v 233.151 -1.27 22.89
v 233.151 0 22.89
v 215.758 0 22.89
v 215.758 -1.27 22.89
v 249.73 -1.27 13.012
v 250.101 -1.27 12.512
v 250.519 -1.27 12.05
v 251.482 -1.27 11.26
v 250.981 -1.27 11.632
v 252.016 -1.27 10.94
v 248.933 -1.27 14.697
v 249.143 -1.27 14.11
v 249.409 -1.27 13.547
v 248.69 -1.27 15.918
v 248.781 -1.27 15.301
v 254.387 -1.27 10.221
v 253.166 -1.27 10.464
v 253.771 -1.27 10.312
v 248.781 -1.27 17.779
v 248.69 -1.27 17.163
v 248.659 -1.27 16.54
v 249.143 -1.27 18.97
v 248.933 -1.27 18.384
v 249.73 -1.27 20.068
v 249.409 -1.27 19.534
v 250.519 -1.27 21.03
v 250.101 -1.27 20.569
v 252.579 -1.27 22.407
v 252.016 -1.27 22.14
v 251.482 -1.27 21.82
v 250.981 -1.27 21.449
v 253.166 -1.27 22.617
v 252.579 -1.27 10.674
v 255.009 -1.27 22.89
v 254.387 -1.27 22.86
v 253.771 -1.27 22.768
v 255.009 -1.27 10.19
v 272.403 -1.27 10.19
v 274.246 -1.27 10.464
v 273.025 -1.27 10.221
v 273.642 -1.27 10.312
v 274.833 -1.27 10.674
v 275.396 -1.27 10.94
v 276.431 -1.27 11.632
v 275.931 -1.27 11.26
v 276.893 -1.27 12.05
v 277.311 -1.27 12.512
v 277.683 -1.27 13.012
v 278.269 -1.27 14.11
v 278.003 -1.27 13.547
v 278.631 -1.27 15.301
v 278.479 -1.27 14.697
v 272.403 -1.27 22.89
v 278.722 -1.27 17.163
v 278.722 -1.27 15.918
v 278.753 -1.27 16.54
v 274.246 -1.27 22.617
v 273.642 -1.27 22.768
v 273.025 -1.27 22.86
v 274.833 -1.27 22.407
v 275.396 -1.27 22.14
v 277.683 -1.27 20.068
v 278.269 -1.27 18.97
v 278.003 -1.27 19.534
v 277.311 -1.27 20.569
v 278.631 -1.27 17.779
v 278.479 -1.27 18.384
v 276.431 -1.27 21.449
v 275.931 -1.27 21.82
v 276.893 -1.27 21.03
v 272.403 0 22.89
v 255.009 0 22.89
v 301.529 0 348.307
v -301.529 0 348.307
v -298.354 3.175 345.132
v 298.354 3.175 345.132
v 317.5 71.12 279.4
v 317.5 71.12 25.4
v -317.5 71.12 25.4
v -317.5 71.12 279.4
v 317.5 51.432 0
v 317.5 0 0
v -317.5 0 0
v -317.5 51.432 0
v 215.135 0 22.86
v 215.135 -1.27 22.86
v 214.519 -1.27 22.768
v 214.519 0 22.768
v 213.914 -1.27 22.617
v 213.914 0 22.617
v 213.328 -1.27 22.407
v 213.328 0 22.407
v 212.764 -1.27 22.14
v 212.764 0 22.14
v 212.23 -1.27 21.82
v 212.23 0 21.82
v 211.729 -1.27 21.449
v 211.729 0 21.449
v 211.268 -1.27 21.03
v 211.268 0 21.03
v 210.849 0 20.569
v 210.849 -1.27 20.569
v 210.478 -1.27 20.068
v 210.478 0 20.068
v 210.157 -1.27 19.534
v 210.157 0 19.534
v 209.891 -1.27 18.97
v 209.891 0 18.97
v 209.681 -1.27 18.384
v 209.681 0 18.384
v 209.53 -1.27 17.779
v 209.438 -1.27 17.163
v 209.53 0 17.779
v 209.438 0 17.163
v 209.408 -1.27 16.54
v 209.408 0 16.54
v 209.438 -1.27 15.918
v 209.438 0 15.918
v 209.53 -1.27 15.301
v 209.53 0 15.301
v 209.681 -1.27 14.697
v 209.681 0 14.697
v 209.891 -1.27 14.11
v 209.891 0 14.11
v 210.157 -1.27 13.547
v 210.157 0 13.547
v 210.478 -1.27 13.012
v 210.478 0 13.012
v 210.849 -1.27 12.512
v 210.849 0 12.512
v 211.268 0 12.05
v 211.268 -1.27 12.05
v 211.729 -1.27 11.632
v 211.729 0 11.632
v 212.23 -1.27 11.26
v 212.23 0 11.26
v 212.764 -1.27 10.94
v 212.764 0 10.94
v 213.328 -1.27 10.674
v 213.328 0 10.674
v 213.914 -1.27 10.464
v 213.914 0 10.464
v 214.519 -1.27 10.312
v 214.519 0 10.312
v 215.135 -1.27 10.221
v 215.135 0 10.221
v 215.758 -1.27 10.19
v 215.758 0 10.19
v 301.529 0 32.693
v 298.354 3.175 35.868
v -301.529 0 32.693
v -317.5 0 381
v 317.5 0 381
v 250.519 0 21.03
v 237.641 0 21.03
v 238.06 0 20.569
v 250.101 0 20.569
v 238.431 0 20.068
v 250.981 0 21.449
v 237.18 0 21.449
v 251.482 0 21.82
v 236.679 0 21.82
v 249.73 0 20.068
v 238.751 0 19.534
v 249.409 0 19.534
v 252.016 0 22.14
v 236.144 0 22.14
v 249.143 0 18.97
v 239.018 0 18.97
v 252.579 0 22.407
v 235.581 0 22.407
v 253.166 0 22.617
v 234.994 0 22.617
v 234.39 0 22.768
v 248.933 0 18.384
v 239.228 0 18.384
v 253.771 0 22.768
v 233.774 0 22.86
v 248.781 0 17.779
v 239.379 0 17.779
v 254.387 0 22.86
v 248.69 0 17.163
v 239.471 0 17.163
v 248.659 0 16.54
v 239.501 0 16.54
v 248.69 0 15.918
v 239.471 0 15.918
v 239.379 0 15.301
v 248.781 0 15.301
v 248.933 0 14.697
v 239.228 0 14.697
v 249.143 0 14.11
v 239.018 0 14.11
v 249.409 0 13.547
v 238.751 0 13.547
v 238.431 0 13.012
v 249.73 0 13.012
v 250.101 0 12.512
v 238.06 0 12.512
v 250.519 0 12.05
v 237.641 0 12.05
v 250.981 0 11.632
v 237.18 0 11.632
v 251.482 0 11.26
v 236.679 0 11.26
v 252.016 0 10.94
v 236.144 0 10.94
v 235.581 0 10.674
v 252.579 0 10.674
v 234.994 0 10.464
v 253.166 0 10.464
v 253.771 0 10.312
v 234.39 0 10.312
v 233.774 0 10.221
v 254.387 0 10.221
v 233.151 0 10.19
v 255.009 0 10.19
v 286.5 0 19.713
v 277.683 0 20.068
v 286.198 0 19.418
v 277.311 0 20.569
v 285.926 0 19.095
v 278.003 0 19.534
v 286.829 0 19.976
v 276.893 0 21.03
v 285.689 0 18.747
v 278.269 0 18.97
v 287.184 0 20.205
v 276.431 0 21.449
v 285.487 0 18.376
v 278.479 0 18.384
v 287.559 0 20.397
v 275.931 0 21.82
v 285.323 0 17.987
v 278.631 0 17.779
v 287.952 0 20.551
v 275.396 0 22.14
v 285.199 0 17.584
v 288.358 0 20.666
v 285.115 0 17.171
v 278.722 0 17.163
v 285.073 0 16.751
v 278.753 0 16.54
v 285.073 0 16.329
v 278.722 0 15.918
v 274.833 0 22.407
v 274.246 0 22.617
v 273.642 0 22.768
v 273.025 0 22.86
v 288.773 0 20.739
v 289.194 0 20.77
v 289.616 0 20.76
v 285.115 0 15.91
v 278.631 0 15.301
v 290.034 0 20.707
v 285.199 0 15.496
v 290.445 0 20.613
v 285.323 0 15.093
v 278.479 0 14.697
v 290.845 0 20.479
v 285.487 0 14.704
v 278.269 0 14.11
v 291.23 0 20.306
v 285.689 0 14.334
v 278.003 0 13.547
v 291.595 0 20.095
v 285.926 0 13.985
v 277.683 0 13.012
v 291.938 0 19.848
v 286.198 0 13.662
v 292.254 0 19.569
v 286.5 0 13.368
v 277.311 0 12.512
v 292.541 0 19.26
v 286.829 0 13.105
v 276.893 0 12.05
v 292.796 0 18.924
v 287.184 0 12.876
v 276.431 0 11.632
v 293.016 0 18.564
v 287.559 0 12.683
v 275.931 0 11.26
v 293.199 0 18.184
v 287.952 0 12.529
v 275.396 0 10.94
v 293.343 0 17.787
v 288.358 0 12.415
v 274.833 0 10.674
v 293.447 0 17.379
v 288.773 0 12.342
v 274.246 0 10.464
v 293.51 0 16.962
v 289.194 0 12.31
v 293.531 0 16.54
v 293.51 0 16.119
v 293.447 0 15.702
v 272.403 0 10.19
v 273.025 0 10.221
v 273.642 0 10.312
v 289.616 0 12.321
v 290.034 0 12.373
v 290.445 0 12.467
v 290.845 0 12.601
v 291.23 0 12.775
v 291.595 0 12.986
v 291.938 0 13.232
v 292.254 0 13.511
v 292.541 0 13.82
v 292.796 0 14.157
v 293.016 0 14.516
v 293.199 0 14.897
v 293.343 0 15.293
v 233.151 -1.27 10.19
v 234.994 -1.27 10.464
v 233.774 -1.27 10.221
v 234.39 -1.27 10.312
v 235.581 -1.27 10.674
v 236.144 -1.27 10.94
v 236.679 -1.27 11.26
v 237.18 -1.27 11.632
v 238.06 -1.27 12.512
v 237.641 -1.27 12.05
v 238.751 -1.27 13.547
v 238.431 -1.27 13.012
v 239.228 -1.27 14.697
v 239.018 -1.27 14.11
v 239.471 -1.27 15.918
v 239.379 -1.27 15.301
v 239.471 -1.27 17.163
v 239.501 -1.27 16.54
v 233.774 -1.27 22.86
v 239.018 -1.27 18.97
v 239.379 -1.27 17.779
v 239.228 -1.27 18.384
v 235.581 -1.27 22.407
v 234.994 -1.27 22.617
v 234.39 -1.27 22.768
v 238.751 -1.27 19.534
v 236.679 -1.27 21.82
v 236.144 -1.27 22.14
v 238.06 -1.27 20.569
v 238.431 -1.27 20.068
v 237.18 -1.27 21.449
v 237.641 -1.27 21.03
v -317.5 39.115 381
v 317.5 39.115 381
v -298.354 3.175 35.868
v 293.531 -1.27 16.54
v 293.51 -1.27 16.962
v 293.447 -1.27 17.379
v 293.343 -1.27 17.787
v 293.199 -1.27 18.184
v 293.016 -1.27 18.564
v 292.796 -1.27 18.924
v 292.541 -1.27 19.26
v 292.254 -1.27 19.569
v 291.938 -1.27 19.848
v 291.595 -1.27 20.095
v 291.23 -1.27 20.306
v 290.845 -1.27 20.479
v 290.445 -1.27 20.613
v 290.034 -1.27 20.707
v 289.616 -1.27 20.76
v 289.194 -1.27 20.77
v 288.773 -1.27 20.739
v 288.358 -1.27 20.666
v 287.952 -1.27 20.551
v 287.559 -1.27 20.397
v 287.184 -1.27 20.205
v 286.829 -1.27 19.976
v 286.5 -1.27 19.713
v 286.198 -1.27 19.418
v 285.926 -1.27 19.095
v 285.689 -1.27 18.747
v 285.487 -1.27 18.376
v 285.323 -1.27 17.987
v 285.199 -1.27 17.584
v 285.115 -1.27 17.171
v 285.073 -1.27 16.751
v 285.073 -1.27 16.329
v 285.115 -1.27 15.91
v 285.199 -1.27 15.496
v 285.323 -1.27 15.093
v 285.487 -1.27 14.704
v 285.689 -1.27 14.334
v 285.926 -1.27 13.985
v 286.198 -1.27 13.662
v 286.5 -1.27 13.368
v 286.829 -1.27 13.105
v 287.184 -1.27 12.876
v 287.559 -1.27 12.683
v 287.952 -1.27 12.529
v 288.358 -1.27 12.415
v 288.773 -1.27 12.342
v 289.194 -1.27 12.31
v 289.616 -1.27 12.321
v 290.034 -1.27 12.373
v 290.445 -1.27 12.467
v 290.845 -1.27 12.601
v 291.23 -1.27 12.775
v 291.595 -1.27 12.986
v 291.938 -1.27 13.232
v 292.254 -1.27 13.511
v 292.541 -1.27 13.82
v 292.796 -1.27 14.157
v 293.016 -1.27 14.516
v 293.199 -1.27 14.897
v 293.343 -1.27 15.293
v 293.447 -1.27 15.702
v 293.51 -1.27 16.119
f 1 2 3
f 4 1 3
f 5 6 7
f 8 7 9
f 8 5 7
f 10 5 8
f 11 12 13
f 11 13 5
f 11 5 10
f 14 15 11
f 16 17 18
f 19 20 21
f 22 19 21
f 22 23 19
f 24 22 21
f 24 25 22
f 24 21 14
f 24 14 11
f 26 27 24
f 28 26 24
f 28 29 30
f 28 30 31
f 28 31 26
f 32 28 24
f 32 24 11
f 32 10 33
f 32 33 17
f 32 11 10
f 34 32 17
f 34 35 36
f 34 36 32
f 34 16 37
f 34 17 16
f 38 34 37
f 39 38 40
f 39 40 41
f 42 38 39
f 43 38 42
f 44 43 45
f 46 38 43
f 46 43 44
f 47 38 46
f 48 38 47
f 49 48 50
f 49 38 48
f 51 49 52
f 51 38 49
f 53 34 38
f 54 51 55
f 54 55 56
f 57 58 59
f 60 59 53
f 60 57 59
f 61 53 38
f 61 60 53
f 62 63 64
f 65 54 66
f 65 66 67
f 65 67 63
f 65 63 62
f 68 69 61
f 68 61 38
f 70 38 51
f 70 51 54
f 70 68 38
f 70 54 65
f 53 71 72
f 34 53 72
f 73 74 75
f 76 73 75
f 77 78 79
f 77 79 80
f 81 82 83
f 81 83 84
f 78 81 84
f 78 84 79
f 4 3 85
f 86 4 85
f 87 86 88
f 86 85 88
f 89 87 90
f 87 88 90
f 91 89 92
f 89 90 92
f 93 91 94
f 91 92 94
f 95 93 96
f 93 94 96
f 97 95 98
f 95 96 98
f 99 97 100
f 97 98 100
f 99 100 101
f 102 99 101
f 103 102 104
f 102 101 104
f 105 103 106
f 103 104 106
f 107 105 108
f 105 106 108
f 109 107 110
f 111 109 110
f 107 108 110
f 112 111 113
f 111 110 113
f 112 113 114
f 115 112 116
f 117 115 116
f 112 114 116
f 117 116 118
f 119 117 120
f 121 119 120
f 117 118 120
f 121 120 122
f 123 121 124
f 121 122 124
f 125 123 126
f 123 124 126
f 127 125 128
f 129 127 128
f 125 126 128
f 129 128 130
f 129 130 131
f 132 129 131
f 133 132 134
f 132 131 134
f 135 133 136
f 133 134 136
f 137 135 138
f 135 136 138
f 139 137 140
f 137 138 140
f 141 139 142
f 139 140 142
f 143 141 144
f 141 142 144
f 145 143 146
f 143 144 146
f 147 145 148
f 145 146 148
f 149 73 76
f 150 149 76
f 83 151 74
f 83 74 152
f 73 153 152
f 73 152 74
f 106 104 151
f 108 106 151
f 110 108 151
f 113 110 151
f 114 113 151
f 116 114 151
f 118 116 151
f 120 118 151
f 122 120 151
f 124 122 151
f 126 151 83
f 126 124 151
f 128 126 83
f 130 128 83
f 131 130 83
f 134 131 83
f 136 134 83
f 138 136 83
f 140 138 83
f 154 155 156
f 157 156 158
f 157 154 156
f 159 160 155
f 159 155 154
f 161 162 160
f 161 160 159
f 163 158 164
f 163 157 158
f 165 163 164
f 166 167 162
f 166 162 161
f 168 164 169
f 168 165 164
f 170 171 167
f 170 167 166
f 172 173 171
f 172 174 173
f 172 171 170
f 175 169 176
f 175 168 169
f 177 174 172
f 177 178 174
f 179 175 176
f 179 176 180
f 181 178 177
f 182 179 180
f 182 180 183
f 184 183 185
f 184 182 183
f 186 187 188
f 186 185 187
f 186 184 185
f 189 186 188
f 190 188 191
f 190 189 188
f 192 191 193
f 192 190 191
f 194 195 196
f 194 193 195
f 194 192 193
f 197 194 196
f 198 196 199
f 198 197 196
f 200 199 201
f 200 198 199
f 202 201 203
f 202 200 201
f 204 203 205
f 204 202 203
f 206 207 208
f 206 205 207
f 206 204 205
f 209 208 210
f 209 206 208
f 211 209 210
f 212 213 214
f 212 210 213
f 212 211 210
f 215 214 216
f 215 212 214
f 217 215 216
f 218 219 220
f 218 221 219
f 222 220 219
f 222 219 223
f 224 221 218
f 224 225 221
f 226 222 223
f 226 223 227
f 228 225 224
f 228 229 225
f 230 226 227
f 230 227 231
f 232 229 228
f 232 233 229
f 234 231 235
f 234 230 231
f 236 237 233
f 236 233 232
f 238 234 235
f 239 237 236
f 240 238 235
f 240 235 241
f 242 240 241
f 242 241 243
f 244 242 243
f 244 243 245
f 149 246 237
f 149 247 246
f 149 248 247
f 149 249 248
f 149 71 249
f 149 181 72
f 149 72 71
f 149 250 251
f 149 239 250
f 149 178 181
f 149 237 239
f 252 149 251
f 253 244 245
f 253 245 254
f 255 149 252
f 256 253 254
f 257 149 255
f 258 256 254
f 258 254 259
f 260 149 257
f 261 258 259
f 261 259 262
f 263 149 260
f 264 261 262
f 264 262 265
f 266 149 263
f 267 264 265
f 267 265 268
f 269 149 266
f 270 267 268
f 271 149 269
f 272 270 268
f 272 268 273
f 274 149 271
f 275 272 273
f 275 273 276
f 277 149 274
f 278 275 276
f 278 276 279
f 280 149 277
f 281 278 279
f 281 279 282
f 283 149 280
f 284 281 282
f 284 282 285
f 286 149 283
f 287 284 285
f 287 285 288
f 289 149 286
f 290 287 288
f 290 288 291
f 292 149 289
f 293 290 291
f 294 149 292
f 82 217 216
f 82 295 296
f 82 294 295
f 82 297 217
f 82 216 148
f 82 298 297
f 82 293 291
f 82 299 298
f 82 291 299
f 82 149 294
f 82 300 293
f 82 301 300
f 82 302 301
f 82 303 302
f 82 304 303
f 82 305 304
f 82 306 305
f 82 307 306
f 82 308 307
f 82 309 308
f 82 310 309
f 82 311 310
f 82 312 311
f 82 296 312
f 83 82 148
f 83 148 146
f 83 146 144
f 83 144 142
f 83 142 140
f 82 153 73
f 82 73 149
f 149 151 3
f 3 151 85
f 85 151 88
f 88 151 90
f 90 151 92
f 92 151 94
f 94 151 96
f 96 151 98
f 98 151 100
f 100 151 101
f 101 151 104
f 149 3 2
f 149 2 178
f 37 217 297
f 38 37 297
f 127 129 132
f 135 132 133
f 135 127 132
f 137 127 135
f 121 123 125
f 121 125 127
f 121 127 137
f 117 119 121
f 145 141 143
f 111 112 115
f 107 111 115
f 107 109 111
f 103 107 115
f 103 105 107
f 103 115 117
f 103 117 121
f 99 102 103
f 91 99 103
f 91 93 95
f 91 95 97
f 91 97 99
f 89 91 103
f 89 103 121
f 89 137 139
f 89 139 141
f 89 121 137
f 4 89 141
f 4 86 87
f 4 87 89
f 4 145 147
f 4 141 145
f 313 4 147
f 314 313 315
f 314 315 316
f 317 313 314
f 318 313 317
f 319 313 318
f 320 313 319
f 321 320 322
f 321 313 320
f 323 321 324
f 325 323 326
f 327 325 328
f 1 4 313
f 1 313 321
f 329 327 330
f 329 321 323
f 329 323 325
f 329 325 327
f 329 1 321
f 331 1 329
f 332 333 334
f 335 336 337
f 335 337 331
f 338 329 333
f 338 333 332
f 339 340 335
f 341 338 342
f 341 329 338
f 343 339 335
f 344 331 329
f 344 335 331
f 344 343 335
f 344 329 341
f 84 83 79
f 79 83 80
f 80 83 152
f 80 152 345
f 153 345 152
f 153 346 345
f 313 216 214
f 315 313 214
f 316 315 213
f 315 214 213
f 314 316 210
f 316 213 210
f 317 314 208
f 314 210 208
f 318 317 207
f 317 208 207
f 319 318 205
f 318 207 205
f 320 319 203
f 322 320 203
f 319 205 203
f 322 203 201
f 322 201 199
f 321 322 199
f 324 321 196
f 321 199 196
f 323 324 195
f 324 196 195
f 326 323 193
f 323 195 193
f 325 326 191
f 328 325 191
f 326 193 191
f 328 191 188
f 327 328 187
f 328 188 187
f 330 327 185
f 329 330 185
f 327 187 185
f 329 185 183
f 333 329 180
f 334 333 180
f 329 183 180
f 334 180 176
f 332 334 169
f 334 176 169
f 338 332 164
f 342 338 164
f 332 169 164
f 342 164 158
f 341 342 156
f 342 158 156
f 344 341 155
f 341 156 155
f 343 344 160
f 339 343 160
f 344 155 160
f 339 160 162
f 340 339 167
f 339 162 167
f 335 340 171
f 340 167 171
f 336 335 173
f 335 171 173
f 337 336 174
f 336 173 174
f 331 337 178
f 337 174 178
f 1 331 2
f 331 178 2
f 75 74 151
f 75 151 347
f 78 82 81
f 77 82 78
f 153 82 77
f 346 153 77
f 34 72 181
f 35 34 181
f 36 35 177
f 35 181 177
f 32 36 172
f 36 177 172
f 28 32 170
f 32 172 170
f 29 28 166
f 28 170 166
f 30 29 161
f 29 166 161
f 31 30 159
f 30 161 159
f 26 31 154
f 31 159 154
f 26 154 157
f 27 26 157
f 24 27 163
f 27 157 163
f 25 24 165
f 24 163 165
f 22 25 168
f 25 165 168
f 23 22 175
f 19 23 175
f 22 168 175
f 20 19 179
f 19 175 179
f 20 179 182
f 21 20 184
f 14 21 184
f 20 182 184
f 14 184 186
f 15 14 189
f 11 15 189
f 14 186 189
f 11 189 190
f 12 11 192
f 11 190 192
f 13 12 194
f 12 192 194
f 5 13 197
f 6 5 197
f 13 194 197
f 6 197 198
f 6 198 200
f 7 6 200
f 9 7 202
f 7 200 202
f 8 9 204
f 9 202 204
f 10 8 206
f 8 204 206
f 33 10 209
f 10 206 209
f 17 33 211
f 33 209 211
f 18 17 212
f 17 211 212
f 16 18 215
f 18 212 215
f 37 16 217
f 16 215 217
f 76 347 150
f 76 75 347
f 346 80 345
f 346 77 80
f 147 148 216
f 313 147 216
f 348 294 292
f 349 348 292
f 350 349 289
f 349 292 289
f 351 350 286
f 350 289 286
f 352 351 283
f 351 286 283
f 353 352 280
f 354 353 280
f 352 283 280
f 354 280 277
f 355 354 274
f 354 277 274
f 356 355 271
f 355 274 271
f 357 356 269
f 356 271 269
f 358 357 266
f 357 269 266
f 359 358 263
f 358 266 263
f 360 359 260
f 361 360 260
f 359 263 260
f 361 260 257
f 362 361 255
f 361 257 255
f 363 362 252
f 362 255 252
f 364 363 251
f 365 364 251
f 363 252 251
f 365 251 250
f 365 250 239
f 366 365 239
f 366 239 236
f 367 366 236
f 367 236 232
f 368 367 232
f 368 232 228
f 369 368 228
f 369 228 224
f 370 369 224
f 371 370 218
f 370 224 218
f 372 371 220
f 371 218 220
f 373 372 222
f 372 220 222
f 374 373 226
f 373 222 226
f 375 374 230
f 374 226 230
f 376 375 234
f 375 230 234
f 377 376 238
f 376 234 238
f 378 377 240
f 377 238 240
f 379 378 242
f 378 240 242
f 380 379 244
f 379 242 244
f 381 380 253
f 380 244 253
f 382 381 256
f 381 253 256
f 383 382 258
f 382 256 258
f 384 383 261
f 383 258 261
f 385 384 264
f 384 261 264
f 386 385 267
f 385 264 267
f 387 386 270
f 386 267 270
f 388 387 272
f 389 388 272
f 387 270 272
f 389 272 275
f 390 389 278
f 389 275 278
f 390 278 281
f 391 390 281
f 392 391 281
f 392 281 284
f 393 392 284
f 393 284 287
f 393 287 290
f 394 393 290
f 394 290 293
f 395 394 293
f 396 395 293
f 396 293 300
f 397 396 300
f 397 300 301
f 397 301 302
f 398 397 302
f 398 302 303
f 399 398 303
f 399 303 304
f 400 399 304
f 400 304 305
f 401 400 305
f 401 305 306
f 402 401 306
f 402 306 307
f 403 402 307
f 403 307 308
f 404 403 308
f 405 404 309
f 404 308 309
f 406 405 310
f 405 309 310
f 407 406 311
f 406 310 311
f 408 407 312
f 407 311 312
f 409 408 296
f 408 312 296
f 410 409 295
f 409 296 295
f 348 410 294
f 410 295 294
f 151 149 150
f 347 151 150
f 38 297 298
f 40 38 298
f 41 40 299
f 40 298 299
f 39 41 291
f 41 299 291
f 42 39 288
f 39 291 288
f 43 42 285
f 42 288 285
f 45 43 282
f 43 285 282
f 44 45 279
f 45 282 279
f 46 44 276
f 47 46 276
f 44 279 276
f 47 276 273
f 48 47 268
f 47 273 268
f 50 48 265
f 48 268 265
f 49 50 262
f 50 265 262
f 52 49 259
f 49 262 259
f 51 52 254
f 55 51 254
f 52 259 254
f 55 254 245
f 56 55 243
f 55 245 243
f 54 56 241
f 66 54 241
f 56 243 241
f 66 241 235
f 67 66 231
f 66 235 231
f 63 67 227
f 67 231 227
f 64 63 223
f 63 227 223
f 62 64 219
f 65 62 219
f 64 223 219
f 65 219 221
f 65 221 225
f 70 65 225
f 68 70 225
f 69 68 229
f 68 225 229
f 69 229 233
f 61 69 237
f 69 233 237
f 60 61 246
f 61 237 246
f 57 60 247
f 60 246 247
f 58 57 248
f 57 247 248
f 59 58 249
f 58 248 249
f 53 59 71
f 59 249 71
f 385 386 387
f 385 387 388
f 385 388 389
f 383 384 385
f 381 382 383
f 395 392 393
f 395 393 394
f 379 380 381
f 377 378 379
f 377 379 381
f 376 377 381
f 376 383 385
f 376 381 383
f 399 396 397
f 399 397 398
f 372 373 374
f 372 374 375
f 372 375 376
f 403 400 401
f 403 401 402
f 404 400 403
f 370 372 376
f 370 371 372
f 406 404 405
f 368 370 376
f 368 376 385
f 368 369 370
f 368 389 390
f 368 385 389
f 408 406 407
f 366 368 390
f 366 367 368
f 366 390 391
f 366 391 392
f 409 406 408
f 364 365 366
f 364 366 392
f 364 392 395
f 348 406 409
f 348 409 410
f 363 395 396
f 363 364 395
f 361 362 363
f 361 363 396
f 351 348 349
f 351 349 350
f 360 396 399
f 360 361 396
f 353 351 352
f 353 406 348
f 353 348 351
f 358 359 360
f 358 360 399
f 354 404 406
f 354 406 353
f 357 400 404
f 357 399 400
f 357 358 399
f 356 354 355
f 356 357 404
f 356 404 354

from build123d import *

# Parameters (mm, degrees)
F1_DEPTH     = 317.5
F2_W         = 606.8687809474
F2_H         = 319.4243614871
F3_DEPTH     = 3.175
F4_T4_DEPTH  = 345.5526606448
F4_T9_DEPTH  = 632.9970801051
F4_T14_DEPTH = 345.5526606448
F4_T19_DEPTH = 632.9970801051
F5_R         = 4.2314330569
F6_DEPTH     = 1.27


# Not quite as in the source:
# - a fillet or chamfer that OpenCascade refuses, or shapes differently, is made with other operations: its cross-section is extruded or revolved along the edge and cut away or added


with BuildPart() as f1:
    # F0 (on Right) → F1 (new body, symmetric)
    with BuildSketch(Plane.YZ):
        Polygon((0, 381), (0, 0), (51.4319166541, 0), (71.12, 25.4), (71.12, 279.4), (39.1150377691, 381), align=None)
    extrude(amount=F1_DEPTH, both=True)

    # F2 (on face) → F3 (cut)
    with BuildSketch(Plane.XZ):
        with Locations((0, 190.5)):
            Rectangle(F2_W, F2_H)
    extrude(amount=-F3_DEPTH, mode=Mode.SUBTRACT)

    # F4: chamfer of 5.08 on 4 edges, made by hand


with BuildPart() as f4_tool2:
    # F4_s3 → F4_t4 (new body)
    with BuildSketch(Plane.XY.offset(363.2763303224)):
        Polygon((-303.4343904737, -1.905), (-298.3543904737, 3.175), (-303.4343904737, 3.175), align=None)
    extrude(amount=-F4_T4_DEPTH)

    split(bisect_by=Plane.XZ, keep=Keep.BOTTOM)


with BuildPart() as f1_1:
    add(f1.part)

    # F4_t1: union F4_tool2
    add(f4_tool2.part)


with BuildPart() as f4_tool7:
    # F4_s8 → F4_t9 (new body)
    with BuildSketch(Plane.YZ.offset(316.4985400526)):
        Polygon((-1.905, 350.2121807435), (3.175, 345.1321807435), (3.175, 350.2121807435), align=None)
    extrude(amount=-F4_T9_DEPTH)

    split(bisect_by=Plane.XZ, keep=Keep.BOTTOM)


with BuildPart() as f1_2:
    add(f1_1.part)

    # F4_t6: union F4_tool7
    add(f4_tool7.part)


with BuildPart() as f4_tool12:
    # F4_s13 → F4_t14 (new body)
    with BuildSketch(Plane.XY.offset(17.7236696776)):
        Polygon((303.4343904737, -1.905), (298.3543904737, 3.175), (303.4343904737, 3.175), align=None)
    extrude(amount=F4_T14_DEPTH)

    split(bisect_by=Plane.XZ, keep=Keep.BOTTOM)


with BuildPart() as f1_3:
    add(f1_2.part)

    # F4_t11: union F4_tool12
    add(f4_tool12.part)


with BuildPart() as f4_tool17:
    # F4_s18 → F4_t19 (new body)
    with BuildSketch(Plane.YZ.offset(-316.4985400526)):
        Polygon((-1.905, 30.7878192565), (3.175, 35.8678192565), (3.175, 30.7878192565), align=None)
    extrude(amount=F4_T19_DEPTH)

    split(bisect_by=Plane.XZ, keep=Keep.BOTTOM)


with BuildPart() as f1_4:
    add(f1_3.part)

    # F4_t16: union F4_tool17
    add(f4_tool17.part)

    # F5 (on face) → F6 (join)
    with BuildSketch(Plane.XZ):
        with BuildLine():
            ThreePointArc((233.1511284661, 10.1901956652), (239.5011284661, 16.5401956652), (233.1511284661, 22.8901956652))
            Line((233.1511284661, 22.8901956652), (215.7576586556, 22.8901956652))
            ThreePointArc((215.7576586556, 22.8901956652), (209.4076586556, 16.5401956652), (215.7576586556, 10.1901956652))
            Line((215.7576586556, 10.1901956652), (233.1511284661, 10.1901956652))
        make_face()
        with BuildLine():
            ThreePointArc((272.4028527737, 10.1901956652), (278.7528527737, 16.5401956652), (272.4028527737, 22.8901956652))
            Line((272.4028527737, 22.8901956652), (255.0093829632, 22.8901956652))
            ThreePointArc((255.0093829632, 22.8901956652), (248.6593829632, 16.5401956652), (255.0093829632, 10.1901956652))
            Line((255.0093829632, 10.1901956652), (272.4028527737, 10.1901956652))
        make_face()
        with Locations((289.2993986607, 16.5401956652)):
            Circle(F5_R)
    extrude(amount=F6_DEPTH)


solid = f1_4.part
